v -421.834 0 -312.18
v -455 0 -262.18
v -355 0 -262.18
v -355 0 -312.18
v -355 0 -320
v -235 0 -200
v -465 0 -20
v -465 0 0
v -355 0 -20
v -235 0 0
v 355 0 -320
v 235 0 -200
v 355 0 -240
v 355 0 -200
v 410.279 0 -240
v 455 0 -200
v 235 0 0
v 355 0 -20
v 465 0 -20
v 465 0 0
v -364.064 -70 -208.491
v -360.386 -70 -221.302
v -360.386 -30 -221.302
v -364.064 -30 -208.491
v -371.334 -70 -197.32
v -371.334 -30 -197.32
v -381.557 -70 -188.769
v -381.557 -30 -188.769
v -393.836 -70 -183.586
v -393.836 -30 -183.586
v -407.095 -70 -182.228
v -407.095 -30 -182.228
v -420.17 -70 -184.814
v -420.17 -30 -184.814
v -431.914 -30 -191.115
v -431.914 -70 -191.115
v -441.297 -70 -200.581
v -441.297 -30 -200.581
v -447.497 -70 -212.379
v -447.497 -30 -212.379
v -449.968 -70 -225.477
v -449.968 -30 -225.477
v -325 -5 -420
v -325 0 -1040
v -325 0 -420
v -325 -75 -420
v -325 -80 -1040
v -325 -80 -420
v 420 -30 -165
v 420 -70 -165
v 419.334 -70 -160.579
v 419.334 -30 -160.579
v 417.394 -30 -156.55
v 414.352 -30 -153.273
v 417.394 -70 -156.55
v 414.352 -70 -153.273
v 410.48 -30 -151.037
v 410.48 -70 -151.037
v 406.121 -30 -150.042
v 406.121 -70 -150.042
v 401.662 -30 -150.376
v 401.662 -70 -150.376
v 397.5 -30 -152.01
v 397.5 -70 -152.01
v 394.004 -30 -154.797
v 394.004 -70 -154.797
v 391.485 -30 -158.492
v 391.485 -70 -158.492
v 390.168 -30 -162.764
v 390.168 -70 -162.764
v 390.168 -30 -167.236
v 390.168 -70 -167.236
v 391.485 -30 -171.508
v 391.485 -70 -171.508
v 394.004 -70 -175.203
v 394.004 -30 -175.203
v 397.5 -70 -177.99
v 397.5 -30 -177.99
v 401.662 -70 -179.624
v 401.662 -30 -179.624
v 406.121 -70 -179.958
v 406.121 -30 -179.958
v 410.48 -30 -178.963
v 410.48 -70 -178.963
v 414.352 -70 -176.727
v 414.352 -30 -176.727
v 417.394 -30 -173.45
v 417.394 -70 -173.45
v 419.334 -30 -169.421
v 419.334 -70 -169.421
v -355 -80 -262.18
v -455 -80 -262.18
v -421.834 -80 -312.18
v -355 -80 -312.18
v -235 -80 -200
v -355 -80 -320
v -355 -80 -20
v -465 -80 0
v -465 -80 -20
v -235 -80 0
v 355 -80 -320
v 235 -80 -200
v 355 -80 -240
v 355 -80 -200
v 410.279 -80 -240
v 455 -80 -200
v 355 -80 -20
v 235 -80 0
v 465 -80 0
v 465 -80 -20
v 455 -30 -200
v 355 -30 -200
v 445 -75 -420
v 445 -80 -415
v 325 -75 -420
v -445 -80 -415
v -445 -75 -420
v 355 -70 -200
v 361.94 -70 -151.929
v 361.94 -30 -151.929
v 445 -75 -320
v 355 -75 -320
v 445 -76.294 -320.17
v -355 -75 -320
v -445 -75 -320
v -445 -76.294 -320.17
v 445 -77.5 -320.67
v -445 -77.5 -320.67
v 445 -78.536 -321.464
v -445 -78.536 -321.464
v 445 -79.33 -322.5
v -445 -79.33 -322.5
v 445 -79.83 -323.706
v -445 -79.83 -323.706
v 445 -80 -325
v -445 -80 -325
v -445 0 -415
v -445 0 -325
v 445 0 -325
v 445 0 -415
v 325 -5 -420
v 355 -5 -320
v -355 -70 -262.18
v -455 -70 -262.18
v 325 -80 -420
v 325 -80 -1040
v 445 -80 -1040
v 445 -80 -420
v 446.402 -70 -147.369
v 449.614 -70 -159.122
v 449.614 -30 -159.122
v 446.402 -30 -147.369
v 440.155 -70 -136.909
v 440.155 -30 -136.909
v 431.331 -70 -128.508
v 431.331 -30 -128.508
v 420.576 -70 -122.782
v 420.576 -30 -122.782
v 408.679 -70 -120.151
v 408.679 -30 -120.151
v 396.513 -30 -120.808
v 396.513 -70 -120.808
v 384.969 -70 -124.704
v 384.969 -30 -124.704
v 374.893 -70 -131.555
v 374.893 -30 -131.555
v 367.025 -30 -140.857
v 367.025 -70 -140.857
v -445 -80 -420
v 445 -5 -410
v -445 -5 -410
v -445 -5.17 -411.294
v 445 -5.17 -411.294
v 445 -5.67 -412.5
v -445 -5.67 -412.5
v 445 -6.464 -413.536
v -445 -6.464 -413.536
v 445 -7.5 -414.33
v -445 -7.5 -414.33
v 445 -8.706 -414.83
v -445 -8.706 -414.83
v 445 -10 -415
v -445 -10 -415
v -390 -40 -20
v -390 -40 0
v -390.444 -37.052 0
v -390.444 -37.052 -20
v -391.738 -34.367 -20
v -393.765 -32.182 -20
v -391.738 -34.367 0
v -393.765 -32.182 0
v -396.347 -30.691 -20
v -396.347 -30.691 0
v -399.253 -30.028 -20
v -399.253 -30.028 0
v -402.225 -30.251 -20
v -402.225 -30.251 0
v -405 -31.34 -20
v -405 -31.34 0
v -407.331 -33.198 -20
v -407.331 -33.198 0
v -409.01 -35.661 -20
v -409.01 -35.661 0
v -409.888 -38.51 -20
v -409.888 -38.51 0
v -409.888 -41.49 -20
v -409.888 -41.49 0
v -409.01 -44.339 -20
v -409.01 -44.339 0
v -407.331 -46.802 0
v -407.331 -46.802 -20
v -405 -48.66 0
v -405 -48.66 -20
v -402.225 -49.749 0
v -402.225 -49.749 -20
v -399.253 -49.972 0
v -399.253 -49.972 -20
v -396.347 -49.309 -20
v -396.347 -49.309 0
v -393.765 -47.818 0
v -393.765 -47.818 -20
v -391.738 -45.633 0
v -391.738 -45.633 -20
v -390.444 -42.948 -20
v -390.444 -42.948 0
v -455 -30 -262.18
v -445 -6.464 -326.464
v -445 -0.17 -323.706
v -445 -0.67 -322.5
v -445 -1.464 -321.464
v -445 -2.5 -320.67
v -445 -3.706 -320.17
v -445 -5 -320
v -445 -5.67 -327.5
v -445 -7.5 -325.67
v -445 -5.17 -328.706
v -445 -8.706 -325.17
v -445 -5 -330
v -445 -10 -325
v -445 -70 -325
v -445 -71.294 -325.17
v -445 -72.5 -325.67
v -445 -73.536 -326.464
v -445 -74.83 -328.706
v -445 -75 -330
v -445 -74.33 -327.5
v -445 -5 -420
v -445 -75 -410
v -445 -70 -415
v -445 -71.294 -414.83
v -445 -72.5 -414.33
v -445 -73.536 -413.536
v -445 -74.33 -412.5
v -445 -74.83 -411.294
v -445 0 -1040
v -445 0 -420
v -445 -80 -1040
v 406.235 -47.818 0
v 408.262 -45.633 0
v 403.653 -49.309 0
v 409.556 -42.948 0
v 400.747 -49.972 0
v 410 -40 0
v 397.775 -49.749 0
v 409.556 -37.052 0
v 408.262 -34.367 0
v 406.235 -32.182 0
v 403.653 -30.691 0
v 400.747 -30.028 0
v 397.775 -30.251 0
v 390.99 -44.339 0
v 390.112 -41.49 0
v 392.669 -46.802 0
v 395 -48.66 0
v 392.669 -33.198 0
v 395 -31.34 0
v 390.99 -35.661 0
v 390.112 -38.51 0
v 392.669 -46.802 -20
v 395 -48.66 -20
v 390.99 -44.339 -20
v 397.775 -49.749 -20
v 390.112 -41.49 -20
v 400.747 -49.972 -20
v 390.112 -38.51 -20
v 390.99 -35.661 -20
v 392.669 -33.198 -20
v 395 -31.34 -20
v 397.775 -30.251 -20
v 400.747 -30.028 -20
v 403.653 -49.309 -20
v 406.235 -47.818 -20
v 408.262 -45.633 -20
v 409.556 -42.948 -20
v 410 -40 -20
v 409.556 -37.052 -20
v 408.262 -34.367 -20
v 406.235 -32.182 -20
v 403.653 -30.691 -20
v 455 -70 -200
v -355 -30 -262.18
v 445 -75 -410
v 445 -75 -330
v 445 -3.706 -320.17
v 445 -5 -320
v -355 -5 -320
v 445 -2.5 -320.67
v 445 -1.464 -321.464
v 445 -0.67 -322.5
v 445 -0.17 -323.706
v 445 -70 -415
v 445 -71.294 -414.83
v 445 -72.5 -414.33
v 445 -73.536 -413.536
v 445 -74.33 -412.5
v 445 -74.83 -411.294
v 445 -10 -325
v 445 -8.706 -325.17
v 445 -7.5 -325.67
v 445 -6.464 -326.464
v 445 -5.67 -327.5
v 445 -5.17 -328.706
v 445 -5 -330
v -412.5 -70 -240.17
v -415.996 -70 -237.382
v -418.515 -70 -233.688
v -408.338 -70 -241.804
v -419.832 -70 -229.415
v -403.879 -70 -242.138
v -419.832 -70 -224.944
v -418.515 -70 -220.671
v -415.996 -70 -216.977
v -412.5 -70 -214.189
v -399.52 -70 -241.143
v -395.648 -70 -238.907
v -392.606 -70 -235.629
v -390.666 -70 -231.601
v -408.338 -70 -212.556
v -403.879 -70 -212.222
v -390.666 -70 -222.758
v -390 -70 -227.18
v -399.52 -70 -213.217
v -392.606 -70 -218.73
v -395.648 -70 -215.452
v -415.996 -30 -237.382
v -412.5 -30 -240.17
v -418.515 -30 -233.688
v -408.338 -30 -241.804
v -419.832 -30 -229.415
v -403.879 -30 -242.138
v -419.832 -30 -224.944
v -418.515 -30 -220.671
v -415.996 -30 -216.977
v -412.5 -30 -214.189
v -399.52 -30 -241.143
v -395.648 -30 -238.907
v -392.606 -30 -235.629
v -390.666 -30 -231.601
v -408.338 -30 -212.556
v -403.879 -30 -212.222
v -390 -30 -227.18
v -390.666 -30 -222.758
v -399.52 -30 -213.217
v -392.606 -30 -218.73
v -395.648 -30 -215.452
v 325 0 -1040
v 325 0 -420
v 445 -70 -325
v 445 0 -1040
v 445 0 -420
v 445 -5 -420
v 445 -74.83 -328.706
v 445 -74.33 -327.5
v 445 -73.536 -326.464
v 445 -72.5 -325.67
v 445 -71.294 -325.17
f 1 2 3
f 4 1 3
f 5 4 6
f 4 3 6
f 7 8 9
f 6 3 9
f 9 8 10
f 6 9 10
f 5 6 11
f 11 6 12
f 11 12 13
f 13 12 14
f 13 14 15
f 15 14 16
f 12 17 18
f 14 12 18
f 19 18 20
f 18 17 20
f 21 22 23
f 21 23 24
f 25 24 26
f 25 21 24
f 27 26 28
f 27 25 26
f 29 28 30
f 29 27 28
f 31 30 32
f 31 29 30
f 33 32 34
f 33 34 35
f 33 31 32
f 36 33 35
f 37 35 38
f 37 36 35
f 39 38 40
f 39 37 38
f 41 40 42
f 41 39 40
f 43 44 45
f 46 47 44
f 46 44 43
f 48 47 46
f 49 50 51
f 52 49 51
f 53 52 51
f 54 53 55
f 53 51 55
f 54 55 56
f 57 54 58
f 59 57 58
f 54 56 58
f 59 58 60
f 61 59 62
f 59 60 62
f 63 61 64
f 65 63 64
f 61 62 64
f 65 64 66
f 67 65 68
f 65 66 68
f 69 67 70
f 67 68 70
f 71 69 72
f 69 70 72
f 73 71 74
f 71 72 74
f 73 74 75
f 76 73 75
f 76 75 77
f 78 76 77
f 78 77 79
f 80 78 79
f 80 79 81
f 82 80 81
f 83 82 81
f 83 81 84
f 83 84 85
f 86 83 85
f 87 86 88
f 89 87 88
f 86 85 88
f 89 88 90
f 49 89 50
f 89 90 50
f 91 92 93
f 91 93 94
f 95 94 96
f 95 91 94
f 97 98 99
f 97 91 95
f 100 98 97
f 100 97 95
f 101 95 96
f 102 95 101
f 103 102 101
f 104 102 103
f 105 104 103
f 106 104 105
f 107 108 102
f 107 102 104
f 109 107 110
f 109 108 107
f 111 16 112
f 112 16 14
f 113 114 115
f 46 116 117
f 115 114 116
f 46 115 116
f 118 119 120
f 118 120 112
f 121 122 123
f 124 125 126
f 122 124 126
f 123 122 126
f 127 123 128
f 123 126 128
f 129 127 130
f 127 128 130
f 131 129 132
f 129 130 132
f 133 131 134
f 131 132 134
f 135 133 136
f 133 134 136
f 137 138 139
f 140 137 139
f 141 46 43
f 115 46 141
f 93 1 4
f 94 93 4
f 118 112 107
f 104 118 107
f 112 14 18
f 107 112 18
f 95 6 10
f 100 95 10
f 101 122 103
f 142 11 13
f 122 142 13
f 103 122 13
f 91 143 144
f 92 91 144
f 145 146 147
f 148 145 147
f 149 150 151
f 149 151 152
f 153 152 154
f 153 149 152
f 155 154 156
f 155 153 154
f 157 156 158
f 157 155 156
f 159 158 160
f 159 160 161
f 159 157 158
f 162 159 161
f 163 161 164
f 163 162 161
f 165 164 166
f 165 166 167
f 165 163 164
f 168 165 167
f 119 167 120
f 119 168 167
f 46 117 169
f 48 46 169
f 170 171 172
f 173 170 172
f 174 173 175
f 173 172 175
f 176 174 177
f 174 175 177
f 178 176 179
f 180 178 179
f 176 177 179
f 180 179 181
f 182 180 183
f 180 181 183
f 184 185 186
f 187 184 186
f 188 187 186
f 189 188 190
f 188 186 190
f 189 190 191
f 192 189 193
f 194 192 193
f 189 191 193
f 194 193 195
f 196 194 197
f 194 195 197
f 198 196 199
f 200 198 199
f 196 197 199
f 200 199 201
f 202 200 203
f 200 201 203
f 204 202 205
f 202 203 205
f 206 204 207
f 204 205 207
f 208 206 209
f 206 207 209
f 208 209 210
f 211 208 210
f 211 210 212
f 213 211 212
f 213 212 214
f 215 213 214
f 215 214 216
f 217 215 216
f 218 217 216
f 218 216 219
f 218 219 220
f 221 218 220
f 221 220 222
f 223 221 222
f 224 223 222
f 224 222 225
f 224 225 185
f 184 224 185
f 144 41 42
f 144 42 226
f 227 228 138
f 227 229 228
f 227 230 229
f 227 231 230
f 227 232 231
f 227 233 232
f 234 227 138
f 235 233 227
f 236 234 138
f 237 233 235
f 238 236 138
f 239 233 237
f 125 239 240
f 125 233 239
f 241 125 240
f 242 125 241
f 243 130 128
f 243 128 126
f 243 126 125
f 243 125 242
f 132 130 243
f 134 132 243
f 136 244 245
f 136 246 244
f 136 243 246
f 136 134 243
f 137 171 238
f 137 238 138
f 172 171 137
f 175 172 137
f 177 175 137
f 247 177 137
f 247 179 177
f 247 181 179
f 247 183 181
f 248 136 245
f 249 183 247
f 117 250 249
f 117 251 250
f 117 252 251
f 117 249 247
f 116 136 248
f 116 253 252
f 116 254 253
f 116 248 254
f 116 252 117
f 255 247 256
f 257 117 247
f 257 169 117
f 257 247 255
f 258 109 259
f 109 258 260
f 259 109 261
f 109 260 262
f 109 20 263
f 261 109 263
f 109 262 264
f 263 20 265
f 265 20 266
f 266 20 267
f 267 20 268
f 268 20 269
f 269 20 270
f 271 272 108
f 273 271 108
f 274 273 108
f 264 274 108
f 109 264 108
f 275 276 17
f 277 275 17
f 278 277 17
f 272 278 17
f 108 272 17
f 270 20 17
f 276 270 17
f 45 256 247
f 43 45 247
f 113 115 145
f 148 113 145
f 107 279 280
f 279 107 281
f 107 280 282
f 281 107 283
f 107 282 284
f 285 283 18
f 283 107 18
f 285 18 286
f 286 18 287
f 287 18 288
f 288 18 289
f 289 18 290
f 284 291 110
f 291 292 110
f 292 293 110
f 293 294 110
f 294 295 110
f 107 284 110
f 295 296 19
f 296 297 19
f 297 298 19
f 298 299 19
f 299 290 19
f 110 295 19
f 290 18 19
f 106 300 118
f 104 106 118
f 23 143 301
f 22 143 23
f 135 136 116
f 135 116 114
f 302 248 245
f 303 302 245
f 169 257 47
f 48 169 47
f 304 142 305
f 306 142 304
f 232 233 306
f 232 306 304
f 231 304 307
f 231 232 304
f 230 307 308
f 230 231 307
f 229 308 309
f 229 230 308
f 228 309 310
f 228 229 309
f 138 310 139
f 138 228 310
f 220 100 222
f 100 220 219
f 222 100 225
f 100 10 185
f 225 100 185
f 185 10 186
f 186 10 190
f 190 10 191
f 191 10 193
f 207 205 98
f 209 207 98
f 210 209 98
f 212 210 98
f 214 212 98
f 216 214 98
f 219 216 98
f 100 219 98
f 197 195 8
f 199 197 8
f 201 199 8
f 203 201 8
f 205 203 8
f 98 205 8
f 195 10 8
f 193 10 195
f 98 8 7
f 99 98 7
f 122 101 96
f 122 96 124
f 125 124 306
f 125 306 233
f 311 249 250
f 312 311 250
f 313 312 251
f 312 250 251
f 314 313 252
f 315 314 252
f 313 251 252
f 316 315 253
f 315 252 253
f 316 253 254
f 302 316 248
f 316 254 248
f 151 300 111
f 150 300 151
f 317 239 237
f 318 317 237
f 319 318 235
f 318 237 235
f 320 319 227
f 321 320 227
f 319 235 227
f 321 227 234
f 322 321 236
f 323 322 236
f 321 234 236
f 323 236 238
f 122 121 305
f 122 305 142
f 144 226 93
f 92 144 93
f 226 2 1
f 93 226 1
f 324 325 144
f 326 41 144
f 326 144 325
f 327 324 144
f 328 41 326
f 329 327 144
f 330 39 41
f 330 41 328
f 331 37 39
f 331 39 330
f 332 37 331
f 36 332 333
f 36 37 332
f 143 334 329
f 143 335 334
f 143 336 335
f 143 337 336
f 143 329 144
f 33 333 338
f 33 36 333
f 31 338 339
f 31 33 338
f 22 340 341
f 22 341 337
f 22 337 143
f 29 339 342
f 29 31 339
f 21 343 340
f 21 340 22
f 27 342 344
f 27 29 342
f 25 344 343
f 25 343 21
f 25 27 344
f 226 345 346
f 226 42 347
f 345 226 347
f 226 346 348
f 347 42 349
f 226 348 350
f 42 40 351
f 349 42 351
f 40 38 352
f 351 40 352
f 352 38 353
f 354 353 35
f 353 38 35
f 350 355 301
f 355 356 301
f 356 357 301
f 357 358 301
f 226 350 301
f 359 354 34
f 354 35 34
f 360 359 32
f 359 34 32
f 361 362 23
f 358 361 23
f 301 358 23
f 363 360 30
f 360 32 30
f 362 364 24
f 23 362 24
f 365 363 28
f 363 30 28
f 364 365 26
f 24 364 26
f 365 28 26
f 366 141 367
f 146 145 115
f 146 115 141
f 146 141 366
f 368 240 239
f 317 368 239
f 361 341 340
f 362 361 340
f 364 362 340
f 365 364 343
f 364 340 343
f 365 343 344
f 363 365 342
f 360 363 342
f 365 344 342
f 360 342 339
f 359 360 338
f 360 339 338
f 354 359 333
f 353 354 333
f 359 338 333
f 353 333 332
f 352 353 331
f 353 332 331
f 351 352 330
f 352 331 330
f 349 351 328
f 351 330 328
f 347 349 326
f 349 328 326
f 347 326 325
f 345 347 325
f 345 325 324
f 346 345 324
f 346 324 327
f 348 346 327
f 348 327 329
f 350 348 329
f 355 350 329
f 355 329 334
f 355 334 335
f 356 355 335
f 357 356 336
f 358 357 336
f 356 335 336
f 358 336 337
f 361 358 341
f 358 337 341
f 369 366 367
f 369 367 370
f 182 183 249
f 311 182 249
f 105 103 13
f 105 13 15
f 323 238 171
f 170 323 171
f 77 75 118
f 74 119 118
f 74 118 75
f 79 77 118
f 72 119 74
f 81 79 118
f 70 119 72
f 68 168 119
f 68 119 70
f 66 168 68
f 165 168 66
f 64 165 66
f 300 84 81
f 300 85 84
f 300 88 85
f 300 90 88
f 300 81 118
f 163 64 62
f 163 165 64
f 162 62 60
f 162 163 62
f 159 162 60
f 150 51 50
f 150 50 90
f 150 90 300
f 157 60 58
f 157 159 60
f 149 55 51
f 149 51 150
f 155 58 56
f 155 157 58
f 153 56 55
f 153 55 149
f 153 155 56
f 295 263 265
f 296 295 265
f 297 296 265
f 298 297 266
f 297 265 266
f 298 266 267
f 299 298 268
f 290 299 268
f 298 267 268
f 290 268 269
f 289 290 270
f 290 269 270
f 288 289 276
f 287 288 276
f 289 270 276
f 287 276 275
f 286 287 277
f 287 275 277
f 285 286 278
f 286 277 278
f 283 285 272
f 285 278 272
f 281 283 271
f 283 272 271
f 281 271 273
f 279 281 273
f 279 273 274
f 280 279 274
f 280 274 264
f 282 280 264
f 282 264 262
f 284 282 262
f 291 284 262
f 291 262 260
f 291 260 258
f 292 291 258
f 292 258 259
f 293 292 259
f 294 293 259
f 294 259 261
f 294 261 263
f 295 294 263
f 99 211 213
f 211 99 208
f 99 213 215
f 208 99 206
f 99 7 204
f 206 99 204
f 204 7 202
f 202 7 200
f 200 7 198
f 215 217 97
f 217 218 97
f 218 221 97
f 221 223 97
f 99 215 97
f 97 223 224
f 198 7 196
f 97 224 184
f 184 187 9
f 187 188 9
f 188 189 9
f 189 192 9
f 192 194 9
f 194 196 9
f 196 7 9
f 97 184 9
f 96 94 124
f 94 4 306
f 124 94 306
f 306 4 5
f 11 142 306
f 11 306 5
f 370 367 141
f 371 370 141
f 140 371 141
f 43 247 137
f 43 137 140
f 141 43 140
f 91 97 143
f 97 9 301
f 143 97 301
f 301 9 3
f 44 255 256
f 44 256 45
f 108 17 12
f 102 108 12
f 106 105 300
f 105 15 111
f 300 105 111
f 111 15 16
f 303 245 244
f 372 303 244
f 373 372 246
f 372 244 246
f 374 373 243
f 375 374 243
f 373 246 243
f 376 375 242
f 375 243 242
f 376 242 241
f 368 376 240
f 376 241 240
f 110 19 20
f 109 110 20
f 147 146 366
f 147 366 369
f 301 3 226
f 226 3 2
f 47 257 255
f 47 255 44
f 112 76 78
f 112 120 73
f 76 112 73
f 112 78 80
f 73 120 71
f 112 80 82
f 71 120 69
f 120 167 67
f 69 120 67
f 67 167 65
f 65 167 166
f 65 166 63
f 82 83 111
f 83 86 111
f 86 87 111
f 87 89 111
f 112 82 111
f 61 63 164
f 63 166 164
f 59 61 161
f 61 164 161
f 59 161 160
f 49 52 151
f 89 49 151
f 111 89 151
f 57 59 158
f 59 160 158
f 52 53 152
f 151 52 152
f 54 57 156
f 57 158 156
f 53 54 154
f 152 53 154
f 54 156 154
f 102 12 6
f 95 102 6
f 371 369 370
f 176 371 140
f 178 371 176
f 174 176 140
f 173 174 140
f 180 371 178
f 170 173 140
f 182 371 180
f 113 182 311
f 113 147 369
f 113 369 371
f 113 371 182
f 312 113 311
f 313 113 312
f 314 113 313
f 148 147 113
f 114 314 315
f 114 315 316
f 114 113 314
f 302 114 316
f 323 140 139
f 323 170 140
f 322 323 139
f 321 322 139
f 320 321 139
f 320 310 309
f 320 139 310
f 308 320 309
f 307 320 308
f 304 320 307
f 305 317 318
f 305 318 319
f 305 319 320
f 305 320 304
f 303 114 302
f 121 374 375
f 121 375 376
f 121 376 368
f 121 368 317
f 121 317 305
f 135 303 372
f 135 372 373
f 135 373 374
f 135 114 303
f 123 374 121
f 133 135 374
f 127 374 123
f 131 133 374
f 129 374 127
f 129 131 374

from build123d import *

# Parameters (mm, degrees)
F0_W      = 470
F0_H      = 400
F0_W_2    = 60
F0_H_2    = 20
F1_DEPTH  = 80
F2_W      = 989.0920937061
F2_H      = 720
F3_DEPTH  = 80
F4_R      = 10
F5_DEPTH  = 25
F7_START  = -10
F6_R      = 15
F7_DEPTH  = 40
F10_DEPTH = 80
F12_DEPTH = 890
F13_R     = 5
F15_DEPTH = 890
F17_DEPTH = 890


with BuildPart() as f1:
    # F0 (on Front) → F1 (new body)
    with BuildSketch(Plane.XZ):
        Polygon((-235, 0), (-355, 0), (-465, 0), (-465, -20), (-355, -20), (-355, -262.1796250343), (-455, -262.1796250343), (-421.8337520964, -312.1796250343), (-355, -312.1796250343), (-355, -1020), (-355, -1040), (-235, -1040), (-235, -840), (235, -840), (235, -1040), (355, -1040), (355, -1020), (355, -240), (410.27864045, -240), (455, -200), (355, -200), (355, -20), (465, -20), (465, 0), (355, 0), (235, 0), (235, -200), (-235, -200), align=None)
        with Locations((0, -520)):
            Rectangle(F0_W, F0_H, mode=Mode.SUBTRACT)
        with Locations((-385, -1030)):
            Rectangle(F0_W_2, F0_H_2)
        with Locations((385, -1030)):
            Rectangle(F0_W_2, F0_H_2)
    extrude(amount=F1_DEPTH)

    # F2 (on face) → F3 (cut)
    with BuildSketch(Plane.XZ.offset(80)):
        with Locations((42.8487956524, -680)):
            Rectangle(F2_W, F2_H)
    extrude(amount=-F3_DEPTH, mode=Mode.SUBTRACT)

    # F4 (on face) → F5 (cut)
    with BuildSketch(Plane.XY):
        with Locations((-400, -40)):
            Circle(F4_R)
        with Locations((400, -40)):
            Circle(F4_R)
    extrude(amount=-F5_DEPTH, mode=Mode.SUBTRACT)

    # F6 (on face) → F7 (join)
    with BuildSketch(Plane.XZ.offset(80).offset(F7_START)):
        with BuildLine():
            Line((-355, -262.1796250343), (-360.3855265494, -221.3018058192))
            ThreePointArc((-360.3855265494, -221.3018058192), (-407.0948116692, -182.2284096551), (-449.9677594515, -225.4765073318))
            Line((-449.9677594515, -225.4765073318), (-455, -262.1796250343))
            Line((-455, -262.1796250343), (-355, -262.1796250343))
        make_face()
        with Locations((-405, -227.1796250343)):
            Circle(F6_R, mode=Mode.SUBTRACT)
        with BuildLine():
            Line((355, -200), (455, -200))
            Line((455, -200), (449.6144734506, -159.1221807849))
            ThreePointArc((449.6144734506, -159.1221807849), (408.6794577223, -120.1506790367), (361.9400684353, -151.9293346135))
            Line((361.9400684353, -151.9293346135), (355, -200))
        make_face()
        with Locations((405, -165)):
            Circle(F6_R, mode=Mode.SUBTRACT)
    extrude(amount=-F7_DEPTH)

    # F9 (on face) → F10 (join)
    with BuildSketch(Plane.XZ.offset(80)):
        Polygon((445, -320), (-445, -320), (-445, -420), (-445, -1040), (-325, -1040), (-325, -420), (325, -420), (325, -1040), (445, -1040), (445, -420), align=None)
    extrude(amount=-F10_DEPTH)

    # F11 (on face) → F12 (cut)
    with BuildSketch(Plane(origin=(-445, 0, 0), x_dir=(0, -1, 0), z_dir=(-1, 0, 0))):
        with BuildLine():
            Line((70, -325), (10, -325))
            ThreePointArc((10, -325), (6.4644660941, -326.4644660941), (5, -330))
            Line((5, -330), (5, -410))
            ThreePointArc((5, -410), (6.4644660941, -413.5355339059), (10, -415))
            Line((10, -415), (70, -415))
            ThreePointArc((70, -415), (73.5355339059, -413.5355339059), (75, -410))
            Line((75, -410), (75, -330))
            ThreePointArc((75, -330), (73.5355339059, -326.4644660941), (70, -325))
        make_face()
    extrude(amount=-F12_DEPTH, mode=Mode.SUBTRACT)

    # F13
    f13_edges = [f1.edges().sort_by_distance(p)[0] for p in [
        (-400, -80, -320),
        (-400, 0, -320),
        (0, -80, -420),
        (0, 0, -420),
        (400, -80, -320),
        (400, 0, -320),
    ]]
    fillet(f13_edges, radius=F13_R)

    # F14 (on face) → F15 (cut)
    with BuildSketch(Plane(origin=(-445, 0, 0), x_dir=(0, -1, 0), z_dir=(-1, 0, 0))):
        Polygon((75, -420), (80, -420), (80, -415), align=None)
        Polygon((0, -415), (0, -420), (5, -420), align=None)
    extrude(amount=-F15_DEPTH, mode=Mode.SUBTRACT)

    # F16 (on face) → F17 (cut)
    with BuildSketch(Plane(origin=(-445, 0, 0), x_dir=(0, -1, 0), z_dir=(-1, 0, 0))):
        with BuildLine():
            ThreePointArc((75, -320), (78.5355339059, -321.4644660941), (80, -325))
            Line((80, -325), (80, -320))
            Line((80, -320), (75, -320))
        make_face()
        with BuildLine():
            ThreePointArc((0, -325), (1.4644660941, -321.4644660941), (5, -320))
            Line((5, -320), (0, -320))
            Line((0, -320), (0, -325))
        make_face()
    extrude(amount=-F17_DEPTH, mode=Mode.SUBTRACT)


solid = f1.part
